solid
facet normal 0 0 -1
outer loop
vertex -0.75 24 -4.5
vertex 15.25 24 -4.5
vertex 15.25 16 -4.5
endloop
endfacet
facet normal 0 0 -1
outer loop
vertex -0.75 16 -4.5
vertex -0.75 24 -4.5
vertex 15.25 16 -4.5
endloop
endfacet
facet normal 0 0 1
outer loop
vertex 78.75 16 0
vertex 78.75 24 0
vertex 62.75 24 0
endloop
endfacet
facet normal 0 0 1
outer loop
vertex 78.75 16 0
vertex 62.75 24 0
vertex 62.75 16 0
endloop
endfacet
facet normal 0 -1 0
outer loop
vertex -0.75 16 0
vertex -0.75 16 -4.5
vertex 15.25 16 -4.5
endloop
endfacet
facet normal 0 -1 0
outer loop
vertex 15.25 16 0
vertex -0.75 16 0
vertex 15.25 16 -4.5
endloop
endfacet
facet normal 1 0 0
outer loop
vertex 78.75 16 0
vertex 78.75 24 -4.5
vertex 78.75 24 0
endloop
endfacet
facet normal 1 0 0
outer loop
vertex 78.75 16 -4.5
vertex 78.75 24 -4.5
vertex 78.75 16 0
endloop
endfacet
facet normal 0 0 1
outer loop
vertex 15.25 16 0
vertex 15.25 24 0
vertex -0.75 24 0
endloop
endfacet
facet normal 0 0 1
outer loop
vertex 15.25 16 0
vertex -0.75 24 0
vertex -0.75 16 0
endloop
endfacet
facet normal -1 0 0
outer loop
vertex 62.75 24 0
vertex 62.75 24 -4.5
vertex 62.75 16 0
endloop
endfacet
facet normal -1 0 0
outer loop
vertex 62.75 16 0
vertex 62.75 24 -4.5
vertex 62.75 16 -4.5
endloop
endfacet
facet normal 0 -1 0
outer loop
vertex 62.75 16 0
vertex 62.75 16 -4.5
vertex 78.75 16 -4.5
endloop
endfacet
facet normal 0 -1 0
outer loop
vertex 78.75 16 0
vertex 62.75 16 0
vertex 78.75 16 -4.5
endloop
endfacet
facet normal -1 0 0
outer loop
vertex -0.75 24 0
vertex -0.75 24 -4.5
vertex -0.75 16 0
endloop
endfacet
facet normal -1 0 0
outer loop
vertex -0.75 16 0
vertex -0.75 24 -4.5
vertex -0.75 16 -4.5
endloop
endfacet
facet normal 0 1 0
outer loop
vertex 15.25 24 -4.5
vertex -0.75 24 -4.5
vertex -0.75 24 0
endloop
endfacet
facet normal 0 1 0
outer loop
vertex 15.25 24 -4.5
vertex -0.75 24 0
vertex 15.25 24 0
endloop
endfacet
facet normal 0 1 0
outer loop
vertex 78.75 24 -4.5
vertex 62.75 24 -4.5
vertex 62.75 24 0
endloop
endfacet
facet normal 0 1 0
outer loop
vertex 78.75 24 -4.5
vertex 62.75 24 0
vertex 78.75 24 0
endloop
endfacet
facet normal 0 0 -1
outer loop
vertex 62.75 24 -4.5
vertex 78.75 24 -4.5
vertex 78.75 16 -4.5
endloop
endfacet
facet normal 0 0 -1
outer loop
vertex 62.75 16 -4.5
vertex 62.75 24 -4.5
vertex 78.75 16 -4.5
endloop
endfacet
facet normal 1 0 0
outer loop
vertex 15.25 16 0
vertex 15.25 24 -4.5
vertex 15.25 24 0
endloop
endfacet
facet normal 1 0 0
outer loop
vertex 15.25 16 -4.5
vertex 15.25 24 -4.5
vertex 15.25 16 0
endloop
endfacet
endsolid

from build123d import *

# Parameters (mm, degrees)
BOX022_W     = 8
BOX022_H     = 16
BOX022_DEPTH = 4.5
BOX021_W     = 8
BOX021_H     = 16
BOX021_DEPTH = 4.5


with BuildPart() as cube021:
    # Box022 → Box022 (new body)
    with BuildSketch(Plane(origin=(-0.75, 24, -4.5), x_dir=(0, -1, 0), z_dir=(0, 0, 1))):
        with Locations((4, 8)):
            Rectangle(BOX022_W, BOX022_H)
    extrude(amount=BOX022_DEPTH)


with BuildPart() as ipsholds:
    # Box021 → Box021 (new body)
    with BuildSketch(Plane(origin=(62.75, 24, -4.5), x_dir=(0, -1, 0), z_dir=(0, 0, 1))):
        with Locations((4, 8)):
            Rectangle(BOX021_W, BOX021_H)
    extrude(amount=BOX021_DEPTH)

    # Fusion042: union Cube021
    add(cube021.part)


solid = ipsholds.part
